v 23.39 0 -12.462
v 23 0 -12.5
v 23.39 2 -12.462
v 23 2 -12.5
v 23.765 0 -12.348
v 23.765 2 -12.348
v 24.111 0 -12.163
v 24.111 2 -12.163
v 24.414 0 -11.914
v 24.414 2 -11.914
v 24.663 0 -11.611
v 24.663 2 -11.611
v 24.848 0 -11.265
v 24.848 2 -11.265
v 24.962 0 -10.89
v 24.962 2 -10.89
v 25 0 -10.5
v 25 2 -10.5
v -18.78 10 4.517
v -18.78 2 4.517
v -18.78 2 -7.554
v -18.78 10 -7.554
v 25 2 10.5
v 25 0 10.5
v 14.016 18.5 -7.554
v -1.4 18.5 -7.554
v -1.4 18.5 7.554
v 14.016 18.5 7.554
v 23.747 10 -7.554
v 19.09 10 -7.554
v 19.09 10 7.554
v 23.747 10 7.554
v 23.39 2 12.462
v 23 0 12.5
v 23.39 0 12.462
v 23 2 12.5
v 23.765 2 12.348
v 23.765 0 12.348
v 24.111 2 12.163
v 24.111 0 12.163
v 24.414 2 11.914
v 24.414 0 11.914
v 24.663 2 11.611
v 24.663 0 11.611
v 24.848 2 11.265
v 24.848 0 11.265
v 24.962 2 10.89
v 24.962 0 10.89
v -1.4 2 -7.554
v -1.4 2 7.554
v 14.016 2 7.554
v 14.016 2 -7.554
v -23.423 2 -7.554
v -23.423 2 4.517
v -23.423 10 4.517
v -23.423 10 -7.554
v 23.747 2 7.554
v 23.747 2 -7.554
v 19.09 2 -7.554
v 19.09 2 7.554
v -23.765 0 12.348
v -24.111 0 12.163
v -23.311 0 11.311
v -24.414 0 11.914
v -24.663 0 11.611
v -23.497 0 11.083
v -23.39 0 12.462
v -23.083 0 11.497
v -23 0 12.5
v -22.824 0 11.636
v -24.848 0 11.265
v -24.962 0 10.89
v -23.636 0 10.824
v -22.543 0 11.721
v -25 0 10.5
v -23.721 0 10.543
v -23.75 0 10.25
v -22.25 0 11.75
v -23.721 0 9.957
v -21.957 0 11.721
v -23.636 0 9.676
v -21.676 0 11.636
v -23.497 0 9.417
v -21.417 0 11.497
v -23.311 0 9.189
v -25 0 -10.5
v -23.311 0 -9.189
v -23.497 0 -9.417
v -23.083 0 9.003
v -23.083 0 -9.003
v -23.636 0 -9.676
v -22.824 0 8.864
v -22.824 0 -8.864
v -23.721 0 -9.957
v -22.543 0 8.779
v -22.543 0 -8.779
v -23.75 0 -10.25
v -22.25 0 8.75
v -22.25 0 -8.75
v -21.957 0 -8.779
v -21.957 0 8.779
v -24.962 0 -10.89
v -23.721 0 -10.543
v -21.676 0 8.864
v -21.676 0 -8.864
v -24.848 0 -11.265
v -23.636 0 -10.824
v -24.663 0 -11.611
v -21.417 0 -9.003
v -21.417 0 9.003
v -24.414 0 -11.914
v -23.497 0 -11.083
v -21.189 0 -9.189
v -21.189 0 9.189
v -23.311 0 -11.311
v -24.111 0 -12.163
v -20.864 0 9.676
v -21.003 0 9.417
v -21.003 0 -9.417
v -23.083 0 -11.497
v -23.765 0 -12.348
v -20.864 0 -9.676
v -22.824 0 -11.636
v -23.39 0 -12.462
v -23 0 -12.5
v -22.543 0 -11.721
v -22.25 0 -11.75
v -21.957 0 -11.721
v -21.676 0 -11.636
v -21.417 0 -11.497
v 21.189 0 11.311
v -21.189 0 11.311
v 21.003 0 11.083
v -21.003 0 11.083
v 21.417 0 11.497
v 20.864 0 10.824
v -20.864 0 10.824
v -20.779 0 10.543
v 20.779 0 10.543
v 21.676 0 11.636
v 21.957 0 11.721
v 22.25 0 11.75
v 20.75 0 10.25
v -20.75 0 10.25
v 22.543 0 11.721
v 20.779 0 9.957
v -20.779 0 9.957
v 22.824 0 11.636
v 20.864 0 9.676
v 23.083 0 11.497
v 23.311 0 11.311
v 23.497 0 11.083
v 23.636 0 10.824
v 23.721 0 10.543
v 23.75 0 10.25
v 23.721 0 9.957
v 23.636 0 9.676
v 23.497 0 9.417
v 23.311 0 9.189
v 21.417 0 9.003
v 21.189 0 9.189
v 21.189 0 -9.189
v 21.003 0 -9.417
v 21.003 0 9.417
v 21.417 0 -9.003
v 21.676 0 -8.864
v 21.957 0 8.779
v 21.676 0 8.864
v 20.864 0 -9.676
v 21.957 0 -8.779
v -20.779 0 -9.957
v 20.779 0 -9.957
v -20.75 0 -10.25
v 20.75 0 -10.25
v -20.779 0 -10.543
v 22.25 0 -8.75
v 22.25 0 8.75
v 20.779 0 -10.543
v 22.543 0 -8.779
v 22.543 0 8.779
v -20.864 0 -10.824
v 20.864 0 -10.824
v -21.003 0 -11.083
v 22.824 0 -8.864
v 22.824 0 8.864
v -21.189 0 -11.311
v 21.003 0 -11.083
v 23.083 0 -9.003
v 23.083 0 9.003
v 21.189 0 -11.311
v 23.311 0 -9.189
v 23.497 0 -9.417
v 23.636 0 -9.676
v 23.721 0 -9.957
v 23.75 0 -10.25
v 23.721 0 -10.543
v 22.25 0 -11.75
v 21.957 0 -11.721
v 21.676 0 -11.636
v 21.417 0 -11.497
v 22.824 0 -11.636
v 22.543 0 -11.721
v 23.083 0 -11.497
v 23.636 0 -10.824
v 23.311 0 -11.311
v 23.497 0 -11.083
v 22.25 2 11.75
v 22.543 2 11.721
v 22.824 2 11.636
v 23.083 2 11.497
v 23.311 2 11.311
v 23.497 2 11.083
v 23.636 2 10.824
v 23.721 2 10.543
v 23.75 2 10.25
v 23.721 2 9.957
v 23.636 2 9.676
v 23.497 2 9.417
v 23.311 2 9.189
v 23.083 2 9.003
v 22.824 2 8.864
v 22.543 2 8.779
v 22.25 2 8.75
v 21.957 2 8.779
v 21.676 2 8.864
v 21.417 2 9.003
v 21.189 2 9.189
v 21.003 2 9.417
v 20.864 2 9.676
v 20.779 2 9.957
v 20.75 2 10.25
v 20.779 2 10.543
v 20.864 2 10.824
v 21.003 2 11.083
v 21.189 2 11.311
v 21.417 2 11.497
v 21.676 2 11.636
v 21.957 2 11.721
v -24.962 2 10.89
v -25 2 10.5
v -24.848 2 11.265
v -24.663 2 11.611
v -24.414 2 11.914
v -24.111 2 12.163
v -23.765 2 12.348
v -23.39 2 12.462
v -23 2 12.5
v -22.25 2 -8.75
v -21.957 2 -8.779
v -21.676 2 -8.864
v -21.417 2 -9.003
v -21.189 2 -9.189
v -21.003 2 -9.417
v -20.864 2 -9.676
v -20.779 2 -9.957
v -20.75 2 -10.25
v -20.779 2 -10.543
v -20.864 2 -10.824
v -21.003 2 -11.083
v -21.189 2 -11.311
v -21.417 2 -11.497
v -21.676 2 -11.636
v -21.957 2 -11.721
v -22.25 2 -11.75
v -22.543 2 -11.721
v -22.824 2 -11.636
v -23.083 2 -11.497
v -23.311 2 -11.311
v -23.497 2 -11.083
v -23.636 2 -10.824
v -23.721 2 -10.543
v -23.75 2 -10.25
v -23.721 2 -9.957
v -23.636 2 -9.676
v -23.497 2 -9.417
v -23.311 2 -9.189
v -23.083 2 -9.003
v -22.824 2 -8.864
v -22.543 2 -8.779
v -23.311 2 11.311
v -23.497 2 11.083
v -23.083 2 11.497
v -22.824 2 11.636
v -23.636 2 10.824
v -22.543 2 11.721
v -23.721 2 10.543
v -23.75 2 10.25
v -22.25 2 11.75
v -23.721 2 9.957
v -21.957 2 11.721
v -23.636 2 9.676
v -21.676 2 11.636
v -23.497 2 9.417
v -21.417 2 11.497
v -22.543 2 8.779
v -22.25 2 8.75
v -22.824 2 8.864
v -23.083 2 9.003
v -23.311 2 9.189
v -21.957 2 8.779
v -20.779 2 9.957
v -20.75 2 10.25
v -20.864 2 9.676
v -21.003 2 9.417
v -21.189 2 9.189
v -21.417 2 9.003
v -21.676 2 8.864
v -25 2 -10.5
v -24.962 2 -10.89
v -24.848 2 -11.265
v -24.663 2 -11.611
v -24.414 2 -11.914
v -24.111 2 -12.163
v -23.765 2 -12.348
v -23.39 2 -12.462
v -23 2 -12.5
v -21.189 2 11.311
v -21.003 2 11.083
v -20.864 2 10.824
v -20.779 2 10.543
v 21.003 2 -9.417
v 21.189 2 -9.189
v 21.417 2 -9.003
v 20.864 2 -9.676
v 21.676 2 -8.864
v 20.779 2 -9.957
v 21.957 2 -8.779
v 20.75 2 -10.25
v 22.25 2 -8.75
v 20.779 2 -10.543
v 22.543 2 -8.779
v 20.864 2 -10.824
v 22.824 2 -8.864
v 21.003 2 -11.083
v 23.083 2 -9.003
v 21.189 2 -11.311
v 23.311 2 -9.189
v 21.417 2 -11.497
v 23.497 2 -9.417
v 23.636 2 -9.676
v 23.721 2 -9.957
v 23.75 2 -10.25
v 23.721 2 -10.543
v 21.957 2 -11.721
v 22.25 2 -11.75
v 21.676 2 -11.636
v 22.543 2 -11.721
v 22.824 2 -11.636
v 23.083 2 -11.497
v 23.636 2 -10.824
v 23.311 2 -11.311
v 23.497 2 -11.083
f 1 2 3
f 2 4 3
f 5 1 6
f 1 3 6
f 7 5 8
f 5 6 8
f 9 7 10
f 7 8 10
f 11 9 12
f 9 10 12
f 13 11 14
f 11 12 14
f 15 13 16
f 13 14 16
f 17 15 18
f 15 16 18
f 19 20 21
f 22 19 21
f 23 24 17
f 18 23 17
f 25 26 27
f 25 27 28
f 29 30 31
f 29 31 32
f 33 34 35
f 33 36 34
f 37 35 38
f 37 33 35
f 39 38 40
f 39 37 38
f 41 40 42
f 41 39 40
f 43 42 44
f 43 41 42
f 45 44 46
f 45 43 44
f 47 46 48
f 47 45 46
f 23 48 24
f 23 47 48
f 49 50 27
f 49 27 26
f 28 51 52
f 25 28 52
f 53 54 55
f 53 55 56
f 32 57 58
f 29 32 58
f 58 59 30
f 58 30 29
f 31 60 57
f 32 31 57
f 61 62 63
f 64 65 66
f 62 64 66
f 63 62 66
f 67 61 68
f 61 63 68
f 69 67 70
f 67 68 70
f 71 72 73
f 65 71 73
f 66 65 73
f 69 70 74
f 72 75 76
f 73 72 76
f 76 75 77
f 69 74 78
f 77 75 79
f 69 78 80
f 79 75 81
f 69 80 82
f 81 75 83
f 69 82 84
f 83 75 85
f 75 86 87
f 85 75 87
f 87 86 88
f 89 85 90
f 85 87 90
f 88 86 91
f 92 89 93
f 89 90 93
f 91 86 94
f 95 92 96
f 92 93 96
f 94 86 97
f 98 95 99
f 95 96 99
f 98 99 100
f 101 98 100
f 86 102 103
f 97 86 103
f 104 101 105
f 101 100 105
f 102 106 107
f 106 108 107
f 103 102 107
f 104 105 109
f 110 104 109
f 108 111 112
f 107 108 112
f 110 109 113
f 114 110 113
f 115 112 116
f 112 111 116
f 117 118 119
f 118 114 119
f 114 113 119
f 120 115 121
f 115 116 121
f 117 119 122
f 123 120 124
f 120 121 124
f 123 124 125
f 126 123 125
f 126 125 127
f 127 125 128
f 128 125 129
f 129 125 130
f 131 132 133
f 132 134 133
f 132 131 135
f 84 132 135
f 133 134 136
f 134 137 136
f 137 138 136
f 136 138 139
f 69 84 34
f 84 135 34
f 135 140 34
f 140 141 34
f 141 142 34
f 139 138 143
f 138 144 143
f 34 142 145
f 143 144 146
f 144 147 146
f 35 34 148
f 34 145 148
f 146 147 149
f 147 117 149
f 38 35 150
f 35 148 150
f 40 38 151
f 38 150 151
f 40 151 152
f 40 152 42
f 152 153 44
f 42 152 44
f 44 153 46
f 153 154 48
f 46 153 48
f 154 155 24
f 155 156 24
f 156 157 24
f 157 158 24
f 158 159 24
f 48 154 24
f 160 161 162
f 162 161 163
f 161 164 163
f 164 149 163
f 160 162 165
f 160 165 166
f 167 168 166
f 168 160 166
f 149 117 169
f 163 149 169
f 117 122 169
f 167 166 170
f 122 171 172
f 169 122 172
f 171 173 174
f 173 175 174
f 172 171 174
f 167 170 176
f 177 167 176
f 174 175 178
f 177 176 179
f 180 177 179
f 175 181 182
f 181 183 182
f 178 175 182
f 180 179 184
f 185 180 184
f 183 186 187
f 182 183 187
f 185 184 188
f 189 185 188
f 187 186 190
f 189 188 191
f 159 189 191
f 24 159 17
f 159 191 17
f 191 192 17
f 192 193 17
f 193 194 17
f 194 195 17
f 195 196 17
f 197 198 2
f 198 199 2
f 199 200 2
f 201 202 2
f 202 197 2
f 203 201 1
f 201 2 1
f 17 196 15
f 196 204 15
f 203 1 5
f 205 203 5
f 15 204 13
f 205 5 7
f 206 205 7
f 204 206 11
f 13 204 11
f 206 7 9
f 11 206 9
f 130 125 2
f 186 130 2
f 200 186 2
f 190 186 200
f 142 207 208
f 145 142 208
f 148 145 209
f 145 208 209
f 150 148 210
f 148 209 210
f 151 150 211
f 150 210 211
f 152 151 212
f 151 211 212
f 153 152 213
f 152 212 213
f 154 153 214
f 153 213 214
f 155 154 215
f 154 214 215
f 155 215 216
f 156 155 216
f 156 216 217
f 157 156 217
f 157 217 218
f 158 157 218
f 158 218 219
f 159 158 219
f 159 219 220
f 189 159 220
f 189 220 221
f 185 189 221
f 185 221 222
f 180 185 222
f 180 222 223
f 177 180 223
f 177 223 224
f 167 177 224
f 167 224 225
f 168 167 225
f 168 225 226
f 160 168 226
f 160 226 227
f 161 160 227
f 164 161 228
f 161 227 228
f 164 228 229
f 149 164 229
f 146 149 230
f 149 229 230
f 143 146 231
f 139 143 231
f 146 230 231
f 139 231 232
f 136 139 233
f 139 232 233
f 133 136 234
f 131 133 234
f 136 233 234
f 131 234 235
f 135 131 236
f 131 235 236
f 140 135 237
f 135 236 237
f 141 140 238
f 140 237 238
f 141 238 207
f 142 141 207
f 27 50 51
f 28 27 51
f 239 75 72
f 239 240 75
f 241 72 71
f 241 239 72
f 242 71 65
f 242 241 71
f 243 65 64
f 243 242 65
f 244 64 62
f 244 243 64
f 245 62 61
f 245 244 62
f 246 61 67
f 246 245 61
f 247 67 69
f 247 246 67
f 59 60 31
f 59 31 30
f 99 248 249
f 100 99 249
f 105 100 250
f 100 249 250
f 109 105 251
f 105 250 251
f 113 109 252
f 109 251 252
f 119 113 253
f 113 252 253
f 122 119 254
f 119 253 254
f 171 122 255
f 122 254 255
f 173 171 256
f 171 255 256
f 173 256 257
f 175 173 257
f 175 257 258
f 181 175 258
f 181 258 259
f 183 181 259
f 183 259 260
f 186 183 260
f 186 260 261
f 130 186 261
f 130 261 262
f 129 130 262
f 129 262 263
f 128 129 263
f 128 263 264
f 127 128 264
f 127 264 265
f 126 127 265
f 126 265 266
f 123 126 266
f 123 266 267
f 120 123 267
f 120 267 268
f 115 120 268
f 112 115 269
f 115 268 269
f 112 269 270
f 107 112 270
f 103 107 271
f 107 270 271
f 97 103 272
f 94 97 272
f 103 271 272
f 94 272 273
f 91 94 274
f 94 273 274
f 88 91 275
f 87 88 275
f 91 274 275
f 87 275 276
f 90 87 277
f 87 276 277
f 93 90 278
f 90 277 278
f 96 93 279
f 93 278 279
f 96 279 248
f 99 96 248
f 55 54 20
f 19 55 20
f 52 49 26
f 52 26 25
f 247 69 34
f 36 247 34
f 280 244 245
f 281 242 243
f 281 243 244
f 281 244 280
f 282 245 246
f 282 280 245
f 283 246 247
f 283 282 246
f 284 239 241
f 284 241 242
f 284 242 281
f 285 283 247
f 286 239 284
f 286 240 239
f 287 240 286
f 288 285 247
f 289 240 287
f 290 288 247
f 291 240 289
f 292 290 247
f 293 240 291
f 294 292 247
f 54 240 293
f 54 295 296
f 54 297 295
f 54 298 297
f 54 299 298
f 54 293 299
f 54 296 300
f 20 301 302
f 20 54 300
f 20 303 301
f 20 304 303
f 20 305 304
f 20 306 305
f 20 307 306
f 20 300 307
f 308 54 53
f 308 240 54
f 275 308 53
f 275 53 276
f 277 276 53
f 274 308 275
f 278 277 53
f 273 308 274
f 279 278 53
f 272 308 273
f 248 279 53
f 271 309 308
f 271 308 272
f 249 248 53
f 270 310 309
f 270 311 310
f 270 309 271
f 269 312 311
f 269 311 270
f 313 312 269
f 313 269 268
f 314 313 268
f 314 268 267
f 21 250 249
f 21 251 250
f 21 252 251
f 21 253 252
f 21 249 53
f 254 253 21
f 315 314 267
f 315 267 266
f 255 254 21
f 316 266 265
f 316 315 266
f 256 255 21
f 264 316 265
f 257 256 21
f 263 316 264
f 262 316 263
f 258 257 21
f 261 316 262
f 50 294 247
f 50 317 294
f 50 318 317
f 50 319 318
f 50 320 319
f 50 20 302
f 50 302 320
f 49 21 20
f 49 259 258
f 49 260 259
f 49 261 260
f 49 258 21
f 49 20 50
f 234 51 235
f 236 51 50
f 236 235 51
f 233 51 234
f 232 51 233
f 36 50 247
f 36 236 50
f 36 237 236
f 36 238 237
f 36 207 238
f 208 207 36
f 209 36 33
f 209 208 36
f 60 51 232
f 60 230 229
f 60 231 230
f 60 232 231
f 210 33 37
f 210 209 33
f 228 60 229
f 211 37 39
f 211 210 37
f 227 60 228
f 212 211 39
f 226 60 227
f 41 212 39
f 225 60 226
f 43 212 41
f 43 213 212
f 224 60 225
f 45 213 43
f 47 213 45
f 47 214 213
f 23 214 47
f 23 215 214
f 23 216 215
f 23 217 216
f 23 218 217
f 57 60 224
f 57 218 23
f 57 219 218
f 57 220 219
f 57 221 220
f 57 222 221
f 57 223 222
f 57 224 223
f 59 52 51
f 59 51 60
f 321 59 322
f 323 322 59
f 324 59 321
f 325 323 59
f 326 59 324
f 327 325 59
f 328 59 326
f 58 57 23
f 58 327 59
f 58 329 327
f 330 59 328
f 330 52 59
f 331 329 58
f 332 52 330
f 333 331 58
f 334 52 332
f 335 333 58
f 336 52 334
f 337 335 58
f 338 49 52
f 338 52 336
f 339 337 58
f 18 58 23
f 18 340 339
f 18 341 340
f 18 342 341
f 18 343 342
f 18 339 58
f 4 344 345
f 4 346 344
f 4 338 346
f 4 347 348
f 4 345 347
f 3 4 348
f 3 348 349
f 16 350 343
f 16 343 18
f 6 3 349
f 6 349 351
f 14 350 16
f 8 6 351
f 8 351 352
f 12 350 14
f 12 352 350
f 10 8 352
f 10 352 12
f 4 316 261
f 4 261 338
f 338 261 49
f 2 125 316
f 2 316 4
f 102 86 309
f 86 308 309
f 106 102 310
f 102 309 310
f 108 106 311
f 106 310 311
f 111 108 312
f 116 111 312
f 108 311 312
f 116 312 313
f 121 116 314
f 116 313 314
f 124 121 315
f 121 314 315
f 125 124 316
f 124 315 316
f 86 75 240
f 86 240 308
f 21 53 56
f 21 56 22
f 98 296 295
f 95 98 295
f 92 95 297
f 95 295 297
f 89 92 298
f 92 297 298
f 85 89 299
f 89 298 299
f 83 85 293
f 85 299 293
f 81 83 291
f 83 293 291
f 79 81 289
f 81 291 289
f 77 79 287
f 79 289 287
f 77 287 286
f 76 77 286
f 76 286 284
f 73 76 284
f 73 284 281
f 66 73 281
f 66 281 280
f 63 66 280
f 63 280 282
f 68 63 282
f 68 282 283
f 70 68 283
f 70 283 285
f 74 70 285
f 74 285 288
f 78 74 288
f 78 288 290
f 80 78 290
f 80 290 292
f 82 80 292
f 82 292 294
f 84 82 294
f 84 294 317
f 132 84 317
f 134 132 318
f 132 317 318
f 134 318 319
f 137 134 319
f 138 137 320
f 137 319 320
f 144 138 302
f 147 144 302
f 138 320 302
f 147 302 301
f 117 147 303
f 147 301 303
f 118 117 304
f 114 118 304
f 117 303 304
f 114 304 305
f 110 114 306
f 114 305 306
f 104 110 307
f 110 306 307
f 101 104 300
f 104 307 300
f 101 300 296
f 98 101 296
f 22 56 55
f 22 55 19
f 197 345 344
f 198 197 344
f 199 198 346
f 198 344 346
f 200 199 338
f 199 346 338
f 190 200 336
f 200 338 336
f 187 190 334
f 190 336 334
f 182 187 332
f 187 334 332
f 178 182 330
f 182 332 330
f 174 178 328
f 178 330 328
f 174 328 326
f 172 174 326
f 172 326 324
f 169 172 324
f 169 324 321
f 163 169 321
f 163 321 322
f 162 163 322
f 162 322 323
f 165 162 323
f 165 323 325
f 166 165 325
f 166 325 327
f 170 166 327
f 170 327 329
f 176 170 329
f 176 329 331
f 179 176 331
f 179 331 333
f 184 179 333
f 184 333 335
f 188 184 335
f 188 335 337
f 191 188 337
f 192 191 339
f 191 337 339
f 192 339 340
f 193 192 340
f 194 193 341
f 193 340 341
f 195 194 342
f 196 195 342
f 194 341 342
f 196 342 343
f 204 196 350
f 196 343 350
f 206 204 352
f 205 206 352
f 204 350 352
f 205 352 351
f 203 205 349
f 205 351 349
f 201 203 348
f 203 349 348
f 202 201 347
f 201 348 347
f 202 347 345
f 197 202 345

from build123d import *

# Parameters (mm, degrees)
SKETCH_1_W          = 50
SKETCH_1_H          = 25
EXTRUDE_1_DEPTH     = 2
SKETCH_2_W          = 15.416574513
SKETCH_2_H          = 15.10736158
EXTRUDE_2_DEPTH     = 16.5
SKETCH_2_6_W        = 4.657076635
SKETCH_2_6_H        = 15.10736158
SKETCH_2_6_W_2      = 4.64276656
SKETCH_2_6_H_2      = 12.070908618
EXTRUDE_3_DEPTH     = 8
SKETCH_3_R          = 1.5
CUT_EXTRUDE_1_DEPTH = 33.457664734
FILLET_1_R          = 2


with BuildPart() as part:
    # 草图1 → 凸台-拉伸1 (new body)
    with BuildSketch(Plane(origin=(0, 0, 0), x_dir=(1, 0, 0), z_dir=(0, 1, 0))):
        Rectangle(SKETCH_1_W, SKETCH_1_H)
    extrude(amount=EXTRUDE_1_DEPTH)

    # 草图2 → 凸台-拉伸2 (add)
    with BuildSketch(Plane(origin=(0, 2, 0), x_dir=(1, 0, 0), z_dir=(0, 1, 0))):
        with Locations((6.307789338, 0)):
            Rectangle(SKETCH_2_W, SKETCH_2_H)
    extrude(amount=EXTRUDE_2_DEPTH)

    # 草图2<6> → 凸台-拉伸3 (add)
    with BuildSketch(Plane(origin=(0, 2, 0), x_dir=(1, 0, 0), z_dir=(0, 1, 0))):
        with Locations((21.418251887, 0)):
            Rectangle(SKETCH_2_6_W, SKETCH_2_6_H)
        with Locations((-21.10123104, 1.518226481)):
            Rectangle(SKETCH_2_6_W_2, SKETCH_2_6_H_2)
    extrude(amount=EXTRUDE_3_DEPTH)

    # 草图3 → 切除-拉伸1 (cut, through all)
    with BuildSketch(Plane(origin=(0, 2, 0), x_dir=(1, 0, 0), z_dir=(0, 1, 0))):
        with Locations((-22.25, 10.25)):
            Circle(SKETCH_3_R)
        with Locations((22.25, 10.25)):
            Circle(SKETCH_3_R)
        with Locations((22.25, -10.25)):
            Circle(SKETCH_3_R)
        with Locations((-22.25, -10.25)):
            Circle(SKETCH_3_R)
    extrude(amount=-CUT_EXTRUDE_1_DEPTH, mode=Mode.SUBTRACT)

    # 圆角1
    fillet_1_edges = [part.edges().sort_by_distance(p)[0] for p in [
        (25, 1, -12.5),
        (25, 1, 12.5),
        (-25, 1, 12.5),
        (-25, 1, -12.5),
    ]]
    fillet(fillet_1_edges, radius=FILLET_1_R)


solid = part.part
